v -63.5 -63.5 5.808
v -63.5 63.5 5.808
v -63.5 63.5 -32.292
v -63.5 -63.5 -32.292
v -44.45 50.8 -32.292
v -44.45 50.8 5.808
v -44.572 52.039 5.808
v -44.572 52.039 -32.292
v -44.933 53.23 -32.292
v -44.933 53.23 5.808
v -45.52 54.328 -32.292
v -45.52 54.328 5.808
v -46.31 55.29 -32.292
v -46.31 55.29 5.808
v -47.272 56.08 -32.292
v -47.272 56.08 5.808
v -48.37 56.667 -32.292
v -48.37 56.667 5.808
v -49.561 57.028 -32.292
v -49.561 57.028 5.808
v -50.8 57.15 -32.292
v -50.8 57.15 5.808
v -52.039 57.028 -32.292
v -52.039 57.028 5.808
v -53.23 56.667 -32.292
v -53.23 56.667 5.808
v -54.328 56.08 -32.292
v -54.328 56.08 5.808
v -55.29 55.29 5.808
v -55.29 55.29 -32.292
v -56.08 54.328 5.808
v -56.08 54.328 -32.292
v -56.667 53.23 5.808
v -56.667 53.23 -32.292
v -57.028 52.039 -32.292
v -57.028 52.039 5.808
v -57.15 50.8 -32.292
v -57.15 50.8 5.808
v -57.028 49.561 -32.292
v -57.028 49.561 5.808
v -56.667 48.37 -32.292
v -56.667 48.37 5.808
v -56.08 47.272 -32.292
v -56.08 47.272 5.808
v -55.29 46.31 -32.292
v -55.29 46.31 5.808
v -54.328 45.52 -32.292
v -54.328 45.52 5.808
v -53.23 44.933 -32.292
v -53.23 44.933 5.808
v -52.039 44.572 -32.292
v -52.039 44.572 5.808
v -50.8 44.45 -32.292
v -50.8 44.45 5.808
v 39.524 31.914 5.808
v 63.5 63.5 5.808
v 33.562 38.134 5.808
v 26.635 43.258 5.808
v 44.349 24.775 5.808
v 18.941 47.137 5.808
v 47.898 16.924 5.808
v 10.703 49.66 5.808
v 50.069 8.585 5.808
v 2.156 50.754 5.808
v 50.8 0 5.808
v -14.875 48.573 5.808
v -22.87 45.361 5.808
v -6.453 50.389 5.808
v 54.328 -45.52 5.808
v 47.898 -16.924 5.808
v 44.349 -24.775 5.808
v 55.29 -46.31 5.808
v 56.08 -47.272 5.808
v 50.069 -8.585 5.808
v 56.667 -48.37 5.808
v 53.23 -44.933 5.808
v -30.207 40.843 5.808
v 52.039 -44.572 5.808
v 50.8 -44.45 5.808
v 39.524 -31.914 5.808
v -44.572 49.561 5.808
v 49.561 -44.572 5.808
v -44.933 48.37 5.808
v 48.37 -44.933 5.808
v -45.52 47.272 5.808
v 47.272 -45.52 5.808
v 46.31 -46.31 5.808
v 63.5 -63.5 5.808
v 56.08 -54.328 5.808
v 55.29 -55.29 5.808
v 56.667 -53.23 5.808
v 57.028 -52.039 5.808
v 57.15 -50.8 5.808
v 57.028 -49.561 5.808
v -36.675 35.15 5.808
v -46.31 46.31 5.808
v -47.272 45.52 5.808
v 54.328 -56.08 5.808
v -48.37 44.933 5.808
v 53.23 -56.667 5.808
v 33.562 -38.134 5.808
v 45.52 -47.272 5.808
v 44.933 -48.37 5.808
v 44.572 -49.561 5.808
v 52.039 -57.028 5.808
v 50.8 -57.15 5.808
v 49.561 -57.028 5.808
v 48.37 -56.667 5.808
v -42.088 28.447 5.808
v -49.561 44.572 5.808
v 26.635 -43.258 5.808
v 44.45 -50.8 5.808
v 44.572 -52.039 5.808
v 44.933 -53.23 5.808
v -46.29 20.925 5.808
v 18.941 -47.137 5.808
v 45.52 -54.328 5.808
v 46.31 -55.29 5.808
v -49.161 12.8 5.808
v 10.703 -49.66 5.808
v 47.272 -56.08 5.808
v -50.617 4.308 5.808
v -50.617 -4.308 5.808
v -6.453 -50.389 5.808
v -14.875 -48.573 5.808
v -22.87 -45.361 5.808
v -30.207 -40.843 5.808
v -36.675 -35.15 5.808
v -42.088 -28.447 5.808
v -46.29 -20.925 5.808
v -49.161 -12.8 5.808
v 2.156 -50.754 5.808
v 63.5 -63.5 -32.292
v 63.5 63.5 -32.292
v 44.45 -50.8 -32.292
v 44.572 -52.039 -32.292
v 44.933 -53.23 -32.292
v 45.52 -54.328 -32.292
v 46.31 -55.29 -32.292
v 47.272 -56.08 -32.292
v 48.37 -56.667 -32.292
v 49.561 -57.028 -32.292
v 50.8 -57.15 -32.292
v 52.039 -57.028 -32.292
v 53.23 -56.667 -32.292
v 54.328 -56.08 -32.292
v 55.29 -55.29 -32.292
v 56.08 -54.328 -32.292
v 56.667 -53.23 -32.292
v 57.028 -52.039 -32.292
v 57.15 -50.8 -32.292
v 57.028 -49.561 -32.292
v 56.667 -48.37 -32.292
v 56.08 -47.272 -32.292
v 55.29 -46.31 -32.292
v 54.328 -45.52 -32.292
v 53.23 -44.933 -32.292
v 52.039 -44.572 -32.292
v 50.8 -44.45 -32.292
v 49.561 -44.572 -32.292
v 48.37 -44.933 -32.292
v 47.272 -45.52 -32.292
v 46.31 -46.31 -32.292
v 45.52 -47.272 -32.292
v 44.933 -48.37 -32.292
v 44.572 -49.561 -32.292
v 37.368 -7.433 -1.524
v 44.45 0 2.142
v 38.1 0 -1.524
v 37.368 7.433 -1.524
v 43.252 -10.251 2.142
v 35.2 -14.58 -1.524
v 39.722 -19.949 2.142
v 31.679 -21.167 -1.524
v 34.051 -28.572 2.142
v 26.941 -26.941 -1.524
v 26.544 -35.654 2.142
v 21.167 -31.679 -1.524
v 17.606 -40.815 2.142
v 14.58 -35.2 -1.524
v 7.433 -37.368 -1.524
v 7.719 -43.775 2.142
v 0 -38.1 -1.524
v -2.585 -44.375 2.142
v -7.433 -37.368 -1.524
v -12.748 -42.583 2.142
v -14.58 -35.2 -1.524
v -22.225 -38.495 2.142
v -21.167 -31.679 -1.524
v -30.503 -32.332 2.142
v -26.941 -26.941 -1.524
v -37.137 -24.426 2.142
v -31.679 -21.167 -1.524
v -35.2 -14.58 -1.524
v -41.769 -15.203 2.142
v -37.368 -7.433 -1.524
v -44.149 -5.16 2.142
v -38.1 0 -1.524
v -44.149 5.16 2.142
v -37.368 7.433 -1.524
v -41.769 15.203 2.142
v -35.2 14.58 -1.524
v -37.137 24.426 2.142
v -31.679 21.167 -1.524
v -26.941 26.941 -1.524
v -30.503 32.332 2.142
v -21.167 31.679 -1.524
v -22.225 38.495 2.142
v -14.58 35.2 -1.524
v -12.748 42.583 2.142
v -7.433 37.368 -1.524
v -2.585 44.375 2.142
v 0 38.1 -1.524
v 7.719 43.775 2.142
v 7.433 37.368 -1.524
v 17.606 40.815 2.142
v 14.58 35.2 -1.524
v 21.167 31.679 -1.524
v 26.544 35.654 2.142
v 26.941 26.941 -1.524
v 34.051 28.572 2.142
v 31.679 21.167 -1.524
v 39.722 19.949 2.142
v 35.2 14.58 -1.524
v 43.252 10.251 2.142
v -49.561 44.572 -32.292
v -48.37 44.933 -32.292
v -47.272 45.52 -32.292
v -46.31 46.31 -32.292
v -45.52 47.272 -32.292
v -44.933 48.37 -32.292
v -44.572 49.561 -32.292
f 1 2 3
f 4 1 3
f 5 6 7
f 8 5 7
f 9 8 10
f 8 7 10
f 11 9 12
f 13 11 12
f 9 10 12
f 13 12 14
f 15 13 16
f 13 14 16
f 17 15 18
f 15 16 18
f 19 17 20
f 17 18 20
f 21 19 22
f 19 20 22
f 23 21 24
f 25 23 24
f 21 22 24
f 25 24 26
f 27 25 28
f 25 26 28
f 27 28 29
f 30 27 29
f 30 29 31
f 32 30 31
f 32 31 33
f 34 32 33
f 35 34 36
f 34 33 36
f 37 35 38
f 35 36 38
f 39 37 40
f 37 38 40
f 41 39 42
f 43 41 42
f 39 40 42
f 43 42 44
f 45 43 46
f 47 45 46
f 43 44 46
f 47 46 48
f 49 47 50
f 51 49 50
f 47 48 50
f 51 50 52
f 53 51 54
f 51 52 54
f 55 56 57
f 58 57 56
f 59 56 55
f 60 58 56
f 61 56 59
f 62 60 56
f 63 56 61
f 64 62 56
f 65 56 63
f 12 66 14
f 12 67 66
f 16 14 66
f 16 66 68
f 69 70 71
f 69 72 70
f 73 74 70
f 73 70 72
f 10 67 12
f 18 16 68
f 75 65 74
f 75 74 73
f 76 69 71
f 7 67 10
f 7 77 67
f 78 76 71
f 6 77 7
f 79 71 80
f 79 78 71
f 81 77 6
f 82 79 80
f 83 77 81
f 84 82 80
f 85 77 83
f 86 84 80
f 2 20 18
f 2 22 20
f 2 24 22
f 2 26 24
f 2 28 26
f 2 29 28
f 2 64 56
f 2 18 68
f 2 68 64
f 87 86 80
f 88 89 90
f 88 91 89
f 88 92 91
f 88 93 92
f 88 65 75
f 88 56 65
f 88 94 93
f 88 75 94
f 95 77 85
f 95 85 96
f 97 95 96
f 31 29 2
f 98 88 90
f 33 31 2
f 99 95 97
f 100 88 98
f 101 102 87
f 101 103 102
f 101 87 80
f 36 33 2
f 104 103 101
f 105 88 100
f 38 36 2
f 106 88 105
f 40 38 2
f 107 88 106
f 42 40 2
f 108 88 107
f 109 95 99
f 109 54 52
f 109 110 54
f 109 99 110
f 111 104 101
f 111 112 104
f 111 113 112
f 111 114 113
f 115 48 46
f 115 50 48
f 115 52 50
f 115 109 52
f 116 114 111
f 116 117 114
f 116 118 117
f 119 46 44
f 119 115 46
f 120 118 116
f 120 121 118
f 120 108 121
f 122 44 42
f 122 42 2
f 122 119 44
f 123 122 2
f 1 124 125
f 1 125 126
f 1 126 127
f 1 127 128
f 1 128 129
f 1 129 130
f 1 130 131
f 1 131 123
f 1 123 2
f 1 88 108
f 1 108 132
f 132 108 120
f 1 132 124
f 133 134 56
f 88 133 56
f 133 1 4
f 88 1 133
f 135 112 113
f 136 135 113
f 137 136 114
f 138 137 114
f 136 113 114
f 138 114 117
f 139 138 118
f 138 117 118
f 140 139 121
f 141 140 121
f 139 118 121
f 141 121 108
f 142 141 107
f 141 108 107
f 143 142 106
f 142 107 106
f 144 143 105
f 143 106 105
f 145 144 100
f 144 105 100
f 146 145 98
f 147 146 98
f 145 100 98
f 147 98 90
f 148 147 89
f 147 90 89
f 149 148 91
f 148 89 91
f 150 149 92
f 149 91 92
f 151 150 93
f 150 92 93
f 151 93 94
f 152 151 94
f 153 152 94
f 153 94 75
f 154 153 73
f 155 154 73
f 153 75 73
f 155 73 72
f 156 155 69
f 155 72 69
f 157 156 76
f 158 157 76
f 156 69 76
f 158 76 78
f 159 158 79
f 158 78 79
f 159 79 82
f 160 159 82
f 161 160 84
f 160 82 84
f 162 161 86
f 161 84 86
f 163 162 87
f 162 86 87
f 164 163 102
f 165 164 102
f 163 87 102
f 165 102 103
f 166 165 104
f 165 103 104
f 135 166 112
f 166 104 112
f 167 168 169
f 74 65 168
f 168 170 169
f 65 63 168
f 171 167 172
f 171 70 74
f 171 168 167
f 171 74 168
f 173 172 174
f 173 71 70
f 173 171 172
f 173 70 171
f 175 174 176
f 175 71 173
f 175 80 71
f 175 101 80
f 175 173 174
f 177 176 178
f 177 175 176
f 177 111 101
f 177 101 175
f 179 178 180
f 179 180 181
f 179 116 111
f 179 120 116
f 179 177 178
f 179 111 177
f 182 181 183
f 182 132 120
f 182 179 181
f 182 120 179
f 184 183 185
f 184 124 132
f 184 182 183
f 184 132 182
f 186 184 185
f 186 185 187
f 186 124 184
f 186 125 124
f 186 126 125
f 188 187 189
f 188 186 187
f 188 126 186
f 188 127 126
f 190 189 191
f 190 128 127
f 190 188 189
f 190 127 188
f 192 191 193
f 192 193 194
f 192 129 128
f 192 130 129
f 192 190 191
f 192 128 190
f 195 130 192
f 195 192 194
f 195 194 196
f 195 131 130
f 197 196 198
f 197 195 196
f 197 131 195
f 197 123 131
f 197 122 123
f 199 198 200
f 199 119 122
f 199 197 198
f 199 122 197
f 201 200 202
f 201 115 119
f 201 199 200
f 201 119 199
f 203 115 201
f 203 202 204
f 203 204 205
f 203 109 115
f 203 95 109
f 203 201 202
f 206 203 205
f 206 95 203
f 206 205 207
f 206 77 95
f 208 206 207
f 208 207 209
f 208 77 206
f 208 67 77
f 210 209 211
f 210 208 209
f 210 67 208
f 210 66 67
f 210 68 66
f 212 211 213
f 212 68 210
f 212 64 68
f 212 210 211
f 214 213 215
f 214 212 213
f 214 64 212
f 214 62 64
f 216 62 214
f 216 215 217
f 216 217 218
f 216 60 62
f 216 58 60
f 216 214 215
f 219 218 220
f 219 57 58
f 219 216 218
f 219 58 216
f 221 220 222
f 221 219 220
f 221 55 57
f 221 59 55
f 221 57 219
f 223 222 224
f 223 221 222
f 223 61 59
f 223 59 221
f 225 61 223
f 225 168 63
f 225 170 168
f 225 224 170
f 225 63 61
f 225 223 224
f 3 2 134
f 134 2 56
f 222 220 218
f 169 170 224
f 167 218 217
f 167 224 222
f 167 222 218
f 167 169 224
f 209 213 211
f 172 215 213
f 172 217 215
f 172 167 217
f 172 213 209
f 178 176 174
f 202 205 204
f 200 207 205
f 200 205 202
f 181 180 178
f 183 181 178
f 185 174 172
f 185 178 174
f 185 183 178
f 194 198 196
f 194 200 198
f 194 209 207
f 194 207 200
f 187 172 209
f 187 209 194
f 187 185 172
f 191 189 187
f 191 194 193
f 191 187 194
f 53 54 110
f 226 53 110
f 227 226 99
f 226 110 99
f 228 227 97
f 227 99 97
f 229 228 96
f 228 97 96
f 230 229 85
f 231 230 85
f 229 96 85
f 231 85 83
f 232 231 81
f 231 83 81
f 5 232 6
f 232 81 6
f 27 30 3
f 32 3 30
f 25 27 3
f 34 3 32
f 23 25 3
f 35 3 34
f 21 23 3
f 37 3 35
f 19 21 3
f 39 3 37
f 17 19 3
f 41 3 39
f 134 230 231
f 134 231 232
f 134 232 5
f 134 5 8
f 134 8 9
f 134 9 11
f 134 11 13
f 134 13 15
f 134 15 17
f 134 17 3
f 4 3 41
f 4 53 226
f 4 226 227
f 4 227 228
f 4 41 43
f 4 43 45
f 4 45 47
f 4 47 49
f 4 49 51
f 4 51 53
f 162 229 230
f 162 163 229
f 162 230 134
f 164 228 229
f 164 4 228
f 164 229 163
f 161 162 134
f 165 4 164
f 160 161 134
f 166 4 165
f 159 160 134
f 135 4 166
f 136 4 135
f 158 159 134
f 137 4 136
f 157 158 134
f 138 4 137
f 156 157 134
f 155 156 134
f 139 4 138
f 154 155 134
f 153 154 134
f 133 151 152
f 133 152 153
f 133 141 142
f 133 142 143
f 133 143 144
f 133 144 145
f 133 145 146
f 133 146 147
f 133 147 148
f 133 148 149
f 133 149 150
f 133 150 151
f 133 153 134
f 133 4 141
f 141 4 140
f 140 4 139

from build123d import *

# Parameters (mm, degrees)
F2_DEPTH = 63.5
F5_DEPTH = 50.8
F7_DEPTH = 50.8


with BuildPart() as f2:
    # F1 (on Front) → F2 (new body, symmetric)
    with BuildSketch(Plane.XZ):
        Polygon((-63.5, -32.291652), (63.5, -32.291652), (63.5, 5.808348), (0, 5.808348), (-63.5, 5.808348), align=None)
    extrude(amount=F2_DEPTH, both=True)

    # F0 (on Front) → F3 (revolve, cut)
    with BuildSketch(Plane.XZ):
        Polygon((38.1, -1.524), (50.8, 5.808348), (0, 5.808348), (0, -1.524), align=None)
    revolve(axis=Axis((0, 0, 2.142174), (0, 0, -1)), mode=Mode.SUBTRACT)

    # F4 (on Top) → F5 (cut, symmetric)
    with BuildSketch(Plane.XY):
        with BuildLine():
            ThreePointArc((-44.45, 50.8), (-55.290128, 55.290128), (-50.8, 44.45))
            Line((-50.8, 44.45), (-50.8, 50.8))
            Line((-50.8, 50.8), (-44.45, 50.8))
        make_face()
        with BuildLine():
            Line((-50.8, 50.8), (-50.8, 44.45))
            ThreePointArc((-50.8, 44.45), (-46.309872, 46.309872), (-44.45, 50.8))
            Line((-44.45, 50.8), (-50.8, 50.8))
        make_face()
    extrude(amount=F5_DEPTH, both=True, mode=Mode.SUBTRACT)

    # F6 (on Top) → F7 (cut, symmetric)
    with BuildSketch(Plane.XY):
        with BuildLine():
            ThreePointArc((50.8, -44.45), (46.309872, -46.309872), (44.45, -50.8))
            Line((44.45, -50.8), (50.8, -50.8))
            Line((50.8, -50.8), (50.8, -44.45))
        make_face()
        with BuildLine():
            Line((50.8, -50.8), (44.45, -50.8))
            ThreePointArc((44.45, -50.8), (50.8, -57.15), (57.15, -50.8))
            ThreePointArc((57.15, -50.8), (55.290128, -46.309872), (50.8, -44.45))
            Line((50.8, -44.45), (50.8, -50.8))
        make_face()
    extrude(amount=F7_DEPTH, both=True, mode=Mode.SUBTRACT)


solid = f2.part
